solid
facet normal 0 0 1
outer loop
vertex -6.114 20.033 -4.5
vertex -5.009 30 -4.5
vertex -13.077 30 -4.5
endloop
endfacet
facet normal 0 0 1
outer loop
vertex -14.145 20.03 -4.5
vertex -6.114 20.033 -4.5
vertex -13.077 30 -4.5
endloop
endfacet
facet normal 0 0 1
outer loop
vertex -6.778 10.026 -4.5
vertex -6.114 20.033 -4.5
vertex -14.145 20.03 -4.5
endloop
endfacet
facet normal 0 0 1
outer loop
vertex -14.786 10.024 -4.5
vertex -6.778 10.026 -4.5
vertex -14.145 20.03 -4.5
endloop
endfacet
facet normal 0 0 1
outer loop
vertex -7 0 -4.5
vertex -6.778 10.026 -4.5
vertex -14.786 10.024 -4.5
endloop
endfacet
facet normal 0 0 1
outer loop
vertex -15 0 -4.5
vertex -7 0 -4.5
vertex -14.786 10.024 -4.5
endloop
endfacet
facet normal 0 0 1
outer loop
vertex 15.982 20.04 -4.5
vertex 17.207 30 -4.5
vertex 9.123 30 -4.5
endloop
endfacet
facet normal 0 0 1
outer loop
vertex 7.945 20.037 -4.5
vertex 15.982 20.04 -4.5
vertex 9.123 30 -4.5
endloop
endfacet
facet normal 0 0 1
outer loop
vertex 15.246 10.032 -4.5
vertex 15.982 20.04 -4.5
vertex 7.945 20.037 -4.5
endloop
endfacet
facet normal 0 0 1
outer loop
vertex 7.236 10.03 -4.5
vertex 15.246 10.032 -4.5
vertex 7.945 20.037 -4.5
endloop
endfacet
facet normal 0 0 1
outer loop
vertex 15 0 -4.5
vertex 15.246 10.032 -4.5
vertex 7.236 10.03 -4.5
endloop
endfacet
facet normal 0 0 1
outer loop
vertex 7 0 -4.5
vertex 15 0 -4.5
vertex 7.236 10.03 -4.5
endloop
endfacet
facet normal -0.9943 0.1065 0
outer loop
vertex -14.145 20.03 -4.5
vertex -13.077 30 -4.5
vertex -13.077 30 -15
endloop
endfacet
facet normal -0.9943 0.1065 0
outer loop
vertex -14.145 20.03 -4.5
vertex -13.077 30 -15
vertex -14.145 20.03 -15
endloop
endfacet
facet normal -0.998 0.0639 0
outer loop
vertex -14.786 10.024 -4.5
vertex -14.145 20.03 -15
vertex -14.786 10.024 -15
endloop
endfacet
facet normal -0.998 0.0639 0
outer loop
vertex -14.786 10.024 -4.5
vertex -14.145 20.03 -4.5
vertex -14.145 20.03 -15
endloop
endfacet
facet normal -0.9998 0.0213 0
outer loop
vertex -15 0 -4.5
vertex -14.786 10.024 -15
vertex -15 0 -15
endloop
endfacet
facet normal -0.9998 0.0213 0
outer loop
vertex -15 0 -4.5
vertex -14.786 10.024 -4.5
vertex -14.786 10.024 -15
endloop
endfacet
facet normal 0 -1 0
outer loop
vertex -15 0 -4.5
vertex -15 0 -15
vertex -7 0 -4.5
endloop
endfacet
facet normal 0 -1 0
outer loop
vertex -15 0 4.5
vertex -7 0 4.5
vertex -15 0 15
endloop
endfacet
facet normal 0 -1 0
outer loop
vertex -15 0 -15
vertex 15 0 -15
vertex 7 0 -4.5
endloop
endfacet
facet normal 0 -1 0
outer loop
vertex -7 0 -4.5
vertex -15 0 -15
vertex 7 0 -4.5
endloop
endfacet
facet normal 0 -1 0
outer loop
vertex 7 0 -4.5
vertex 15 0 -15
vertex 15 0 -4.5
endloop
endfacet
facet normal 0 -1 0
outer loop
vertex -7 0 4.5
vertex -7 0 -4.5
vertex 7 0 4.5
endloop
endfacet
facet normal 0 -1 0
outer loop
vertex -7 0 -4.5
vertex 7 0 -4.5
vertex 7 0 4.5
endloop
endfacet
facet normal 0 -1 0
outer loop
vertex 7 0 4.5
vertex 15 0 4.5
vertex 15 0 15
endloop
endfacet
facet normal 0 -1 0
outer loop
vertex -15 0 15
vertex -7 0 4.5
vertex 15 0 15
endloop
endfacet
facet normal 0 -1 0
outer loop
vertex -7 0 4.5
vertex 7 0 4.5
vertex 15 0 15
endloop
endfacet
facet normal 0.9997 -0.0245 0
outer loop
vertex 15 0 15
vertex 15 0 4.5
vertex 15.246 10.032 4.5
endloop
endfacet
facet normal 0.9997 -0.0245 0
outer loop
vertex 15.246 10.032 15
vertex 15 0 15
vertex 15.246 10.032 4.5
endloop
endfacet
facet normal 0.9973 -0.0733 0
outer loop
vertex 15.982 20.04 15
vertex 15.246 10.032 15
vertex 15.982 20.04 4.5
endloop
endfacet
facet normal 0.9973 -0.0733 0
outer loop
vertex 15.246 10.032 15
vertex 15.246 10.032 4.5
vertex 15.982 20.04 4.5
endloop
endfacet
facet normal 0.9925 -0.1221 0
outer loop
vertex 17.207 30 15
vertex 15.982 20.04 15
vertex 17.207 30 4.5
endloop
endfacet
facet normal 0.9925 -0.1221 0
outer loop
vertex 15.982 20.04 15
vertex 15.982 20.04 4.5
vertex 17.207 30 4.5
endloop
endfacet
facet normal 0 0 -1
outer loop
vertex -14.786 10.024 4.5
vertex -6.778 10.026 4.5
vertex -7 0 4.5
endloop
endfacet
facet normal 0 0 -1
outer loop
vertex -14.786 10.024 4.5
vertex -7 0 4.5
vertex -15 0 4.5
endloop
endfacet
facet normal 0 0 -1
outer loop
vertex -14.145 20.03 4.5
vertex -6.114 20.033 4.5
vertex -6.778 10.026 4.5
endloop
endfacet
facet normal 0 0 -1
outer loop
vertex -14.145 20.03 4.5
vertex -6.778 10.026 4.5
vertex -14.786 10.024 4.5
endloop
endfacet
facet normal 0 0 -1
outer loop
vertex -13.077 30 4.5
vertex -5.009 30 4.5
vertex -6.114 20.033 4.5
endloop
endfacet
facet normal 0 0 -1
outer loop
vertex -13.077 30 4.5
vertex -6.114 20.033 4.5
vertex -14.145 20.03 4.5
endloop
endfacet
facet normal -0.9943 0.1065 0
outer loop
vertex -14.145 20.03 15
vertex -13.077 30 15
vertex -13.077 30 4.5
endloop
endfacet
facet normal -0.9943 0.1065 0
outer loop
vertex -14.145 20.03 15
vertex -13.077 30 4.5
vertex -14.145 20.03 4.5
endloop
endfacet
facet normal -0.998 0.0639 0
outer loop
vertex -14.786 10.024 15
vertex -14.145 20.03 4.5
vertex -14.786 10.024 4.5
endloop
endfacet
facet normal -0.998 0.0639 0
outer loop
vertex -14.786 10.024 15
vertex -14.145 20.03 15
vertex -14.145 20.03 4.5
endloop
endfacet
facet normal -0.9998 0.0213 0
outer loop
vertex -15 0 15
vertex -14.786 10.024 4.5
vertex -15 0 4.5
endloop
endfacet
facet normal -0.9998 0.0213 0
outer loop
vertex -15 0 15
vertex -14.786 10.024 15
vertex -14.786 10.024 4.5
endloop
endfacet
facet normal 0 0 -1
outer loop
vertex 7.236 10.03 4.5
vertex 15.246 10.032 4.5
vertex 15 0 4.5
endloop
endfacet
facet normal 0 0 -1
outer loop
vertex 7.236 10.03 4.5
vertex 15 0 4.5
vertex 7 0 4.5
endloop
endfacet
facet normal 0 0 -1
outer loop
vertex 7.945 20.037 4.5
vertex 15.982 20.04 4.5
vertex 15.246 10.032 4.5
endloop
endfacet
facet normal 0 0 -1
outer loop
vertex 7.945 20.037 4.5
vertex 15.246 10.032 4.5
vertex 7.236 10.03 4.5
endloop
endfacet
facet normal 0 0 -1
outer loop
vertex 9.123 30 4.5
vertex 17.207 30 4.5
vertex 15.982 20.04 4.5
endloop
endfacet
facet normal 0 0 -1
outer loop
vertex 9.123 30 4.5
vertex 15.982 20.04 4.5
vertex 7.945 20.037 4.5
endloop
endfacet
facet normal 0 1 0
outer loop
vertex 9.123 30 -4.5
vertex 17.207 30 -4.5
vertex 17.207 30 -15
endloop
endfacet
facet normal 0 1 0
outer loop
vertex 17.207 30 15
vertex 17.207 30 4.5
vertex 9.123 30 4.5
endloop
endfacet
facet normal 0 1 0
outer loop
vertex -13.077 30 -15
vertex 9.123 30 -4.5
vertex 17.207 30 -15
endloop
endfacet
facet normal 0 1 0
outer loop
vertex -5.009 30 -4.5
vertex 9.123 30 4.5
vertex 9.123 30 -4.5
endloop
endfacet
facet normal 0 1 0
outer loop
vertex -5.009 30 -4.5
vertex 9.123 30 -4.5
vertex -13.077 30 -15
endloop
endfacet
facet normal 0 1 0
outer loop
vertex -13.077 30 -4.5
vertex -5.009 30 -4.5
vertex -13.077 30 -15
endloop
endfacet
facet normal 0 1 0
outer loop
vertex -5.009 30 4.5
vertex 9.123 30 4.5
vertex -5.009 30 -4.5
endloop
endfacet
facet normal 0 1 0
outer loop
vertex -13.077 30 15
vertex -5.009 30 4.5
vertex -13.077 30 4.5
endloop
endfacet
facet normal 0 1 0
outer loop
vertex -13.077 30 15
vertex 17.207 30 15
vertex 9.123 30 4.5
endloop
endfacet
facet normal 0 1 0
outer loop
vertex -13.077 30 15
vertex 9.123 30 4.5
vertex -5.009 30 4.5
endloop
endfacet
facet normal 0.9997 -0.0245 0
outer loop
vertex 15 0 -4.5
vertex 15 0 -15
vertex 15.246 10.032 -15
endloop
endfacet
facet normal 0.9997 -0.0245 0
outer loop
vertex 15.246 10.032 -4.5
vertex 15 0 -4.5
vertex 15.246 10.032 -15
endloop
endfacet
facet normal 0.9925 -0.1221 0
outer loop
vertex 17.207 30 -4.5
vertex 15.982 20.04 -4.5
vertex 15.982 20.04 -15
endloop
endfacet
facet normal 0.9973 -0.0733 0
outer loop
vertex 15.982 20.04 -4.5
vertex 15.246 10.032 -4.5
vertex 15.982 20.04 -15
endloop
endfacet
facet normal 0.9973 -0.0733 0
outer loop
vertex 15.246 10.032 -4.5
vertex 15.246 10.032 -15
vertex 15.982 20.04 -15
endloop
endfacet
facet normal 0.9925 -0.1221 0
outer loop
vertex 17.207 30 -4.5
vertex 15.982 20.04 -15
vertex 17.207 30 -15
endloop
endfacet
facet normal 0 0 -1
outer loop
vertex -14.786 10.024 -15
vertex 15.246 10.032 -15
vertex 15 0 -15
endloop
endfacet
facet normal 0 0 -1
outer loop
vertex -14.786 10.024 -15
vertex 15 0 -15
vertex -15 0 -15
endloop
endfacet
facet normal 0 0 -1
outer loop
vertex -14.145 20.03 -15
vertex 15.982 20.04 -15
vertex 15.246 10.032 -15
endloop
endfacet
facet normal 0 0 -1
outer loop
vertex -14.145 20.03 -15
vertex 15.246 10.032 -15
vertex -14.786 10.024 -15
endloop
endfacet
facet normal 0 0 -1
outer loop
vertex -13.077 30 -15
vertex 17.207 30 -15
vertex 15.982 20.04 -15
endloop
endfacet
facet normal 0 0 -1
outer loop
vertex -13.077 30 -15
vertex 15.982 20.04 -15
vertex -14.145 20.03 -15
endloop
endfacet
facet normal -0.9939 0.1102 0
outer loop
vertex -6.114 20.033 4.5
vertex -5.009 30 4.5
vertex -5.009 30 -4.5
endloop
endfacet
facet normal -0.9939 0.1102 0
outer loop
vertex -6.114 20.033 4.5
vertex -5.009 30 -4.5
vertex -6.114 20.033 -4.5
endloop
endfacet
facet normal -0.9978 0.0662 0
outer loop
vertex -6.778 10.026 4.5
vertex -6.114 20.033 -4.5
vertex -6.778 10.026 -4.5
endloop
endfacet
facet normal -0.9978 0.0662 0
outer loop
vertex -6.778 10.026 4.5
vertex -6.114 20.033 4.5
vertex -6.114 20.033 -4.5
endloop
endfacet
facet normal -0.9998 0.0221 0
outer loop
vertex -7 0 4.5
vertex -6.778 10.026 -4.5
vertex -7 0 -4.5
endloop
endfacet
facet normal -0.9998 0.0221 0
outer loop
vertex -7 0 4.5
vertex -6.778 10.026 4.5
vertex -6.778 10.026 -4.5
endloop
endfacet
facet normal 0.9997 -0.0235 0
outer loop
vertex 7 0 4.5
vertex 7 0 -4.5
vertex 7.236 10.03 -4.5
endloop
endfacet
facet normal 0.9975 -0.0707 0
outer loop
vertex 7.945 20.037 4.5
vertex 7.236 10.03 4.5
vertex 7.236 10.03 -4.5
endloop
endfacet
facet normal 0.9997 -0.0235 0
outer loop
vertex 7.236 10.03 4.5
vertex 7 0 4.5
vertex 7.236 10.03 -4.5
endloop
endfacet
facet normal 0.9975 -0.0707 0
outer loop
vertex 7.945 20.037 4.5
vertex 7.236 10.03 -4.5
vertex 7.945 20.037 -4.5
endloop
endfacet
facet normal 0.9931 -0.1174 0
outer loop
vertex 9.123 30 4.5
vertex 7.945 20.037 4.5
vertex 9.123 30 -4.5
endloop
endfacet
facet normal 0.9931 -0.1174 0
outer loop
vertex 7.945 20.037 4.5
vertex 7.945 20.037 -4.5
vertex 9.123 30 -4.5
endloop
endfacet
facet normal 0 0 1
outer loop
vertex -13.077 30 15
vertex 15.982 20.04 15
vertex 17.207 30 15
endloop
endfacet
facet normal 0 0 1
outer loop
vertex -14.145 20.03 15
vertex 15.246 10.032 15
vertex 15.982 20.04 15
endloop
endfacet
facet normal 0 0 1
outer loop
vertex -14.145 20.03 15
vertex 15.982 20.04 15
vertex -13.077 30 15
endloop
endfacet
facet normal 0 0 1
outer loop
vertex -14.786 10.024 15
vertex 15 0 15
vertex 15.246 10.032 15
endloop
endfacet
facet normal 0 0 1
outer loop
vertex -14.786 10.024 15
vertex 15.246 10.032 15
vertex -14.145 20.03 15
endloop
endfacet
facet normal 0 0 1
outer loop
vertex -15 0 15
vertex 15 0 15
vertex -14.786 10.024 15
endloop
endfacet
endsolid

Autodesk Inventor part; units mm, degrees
ref_plane "YZ Plane" through (0, 0, 0) normal (1, 0, 0) x (0, 1, 0)
ref_plane "XY Plane" through (0, 0, 0) normal (0, 0, 1) x (1, 0, 0)
sketch "Sketch1" plane through (0, 0, 0) normal (0, 0, 1) x (1, 0, 0)
  arc A0 (440, 0) -> (0, 0) centre (220, 0) ccw
  dimension "d1" = 440
  dimension "d17" = 220
sketch "Sketch2" plane through (0, 0, 0) normal (0, 1, 0) x (-1, 0, 0)
  line L0 (15, 15) -> (-15, 15)
  line L1 (-15, -15) -> (15, -15)
  line L2 (15, 4.5) -> (7, 4.5)
  line L3 (7, 4.5) -> (7, -4.5)
  line L4 (7, -4.5) -> (15, -4.5)
  line L5 (-15, 4.5) -> (-7, 4.5)
  line L6 (-7, 4.5) -> (-7, -4.5)
  line L7 (-7, -4.5) -> (-15, -4.5)
  line L8 (15, -15) -> (15, -4.5)
  line L9 (15, 4.5) -> (15, 15)
  line L10 (-15, 15) -> (-15, 4.5)
  line L11 (-15, -4.5) -> (-15, -15)
  point P0 (0, 0)
  dimension "d18" = 9
  dimension "d19" = 8
  dimension "d21" = 14
  dimension "d22" = 30
  dimension "d23" = 15
  dimension "d24" = 4.5
  dimension "d25" = 7
sweep "Sweep1" add profiles "Sketch2" path "Sketch1"
sketch "Sketch4" plane through (-15, 0, 15) normal (0, 0, 1) x (1, 0, 0)
  line L0 (470, 0) -> (440, 0) projected
  line L1 (470, 0) -> (51.3779, 0)
  line L2 (51.3779, 0) -> (51.3779, 30)
  line L3 (51.3779, 30) -> (0.5743, 30)
  line L4 (0.5743, 30) -> (0.5743, 269.0711)
  line L5 (0.5743, 269.0711) -> (470, 269.0711)
  line L6 (470, 269.0711) -> (470, 0)
  point P0 (15, 0)
  dimension "d34" = 469.4257
  dimension "d35" = 30
  dimension "d36" = 50.8036
  dimension "d37" = 269.0711
extrude "Extrusion2" cut sketch "Sketch4" against normal through all
properties part number "LightRail01"
